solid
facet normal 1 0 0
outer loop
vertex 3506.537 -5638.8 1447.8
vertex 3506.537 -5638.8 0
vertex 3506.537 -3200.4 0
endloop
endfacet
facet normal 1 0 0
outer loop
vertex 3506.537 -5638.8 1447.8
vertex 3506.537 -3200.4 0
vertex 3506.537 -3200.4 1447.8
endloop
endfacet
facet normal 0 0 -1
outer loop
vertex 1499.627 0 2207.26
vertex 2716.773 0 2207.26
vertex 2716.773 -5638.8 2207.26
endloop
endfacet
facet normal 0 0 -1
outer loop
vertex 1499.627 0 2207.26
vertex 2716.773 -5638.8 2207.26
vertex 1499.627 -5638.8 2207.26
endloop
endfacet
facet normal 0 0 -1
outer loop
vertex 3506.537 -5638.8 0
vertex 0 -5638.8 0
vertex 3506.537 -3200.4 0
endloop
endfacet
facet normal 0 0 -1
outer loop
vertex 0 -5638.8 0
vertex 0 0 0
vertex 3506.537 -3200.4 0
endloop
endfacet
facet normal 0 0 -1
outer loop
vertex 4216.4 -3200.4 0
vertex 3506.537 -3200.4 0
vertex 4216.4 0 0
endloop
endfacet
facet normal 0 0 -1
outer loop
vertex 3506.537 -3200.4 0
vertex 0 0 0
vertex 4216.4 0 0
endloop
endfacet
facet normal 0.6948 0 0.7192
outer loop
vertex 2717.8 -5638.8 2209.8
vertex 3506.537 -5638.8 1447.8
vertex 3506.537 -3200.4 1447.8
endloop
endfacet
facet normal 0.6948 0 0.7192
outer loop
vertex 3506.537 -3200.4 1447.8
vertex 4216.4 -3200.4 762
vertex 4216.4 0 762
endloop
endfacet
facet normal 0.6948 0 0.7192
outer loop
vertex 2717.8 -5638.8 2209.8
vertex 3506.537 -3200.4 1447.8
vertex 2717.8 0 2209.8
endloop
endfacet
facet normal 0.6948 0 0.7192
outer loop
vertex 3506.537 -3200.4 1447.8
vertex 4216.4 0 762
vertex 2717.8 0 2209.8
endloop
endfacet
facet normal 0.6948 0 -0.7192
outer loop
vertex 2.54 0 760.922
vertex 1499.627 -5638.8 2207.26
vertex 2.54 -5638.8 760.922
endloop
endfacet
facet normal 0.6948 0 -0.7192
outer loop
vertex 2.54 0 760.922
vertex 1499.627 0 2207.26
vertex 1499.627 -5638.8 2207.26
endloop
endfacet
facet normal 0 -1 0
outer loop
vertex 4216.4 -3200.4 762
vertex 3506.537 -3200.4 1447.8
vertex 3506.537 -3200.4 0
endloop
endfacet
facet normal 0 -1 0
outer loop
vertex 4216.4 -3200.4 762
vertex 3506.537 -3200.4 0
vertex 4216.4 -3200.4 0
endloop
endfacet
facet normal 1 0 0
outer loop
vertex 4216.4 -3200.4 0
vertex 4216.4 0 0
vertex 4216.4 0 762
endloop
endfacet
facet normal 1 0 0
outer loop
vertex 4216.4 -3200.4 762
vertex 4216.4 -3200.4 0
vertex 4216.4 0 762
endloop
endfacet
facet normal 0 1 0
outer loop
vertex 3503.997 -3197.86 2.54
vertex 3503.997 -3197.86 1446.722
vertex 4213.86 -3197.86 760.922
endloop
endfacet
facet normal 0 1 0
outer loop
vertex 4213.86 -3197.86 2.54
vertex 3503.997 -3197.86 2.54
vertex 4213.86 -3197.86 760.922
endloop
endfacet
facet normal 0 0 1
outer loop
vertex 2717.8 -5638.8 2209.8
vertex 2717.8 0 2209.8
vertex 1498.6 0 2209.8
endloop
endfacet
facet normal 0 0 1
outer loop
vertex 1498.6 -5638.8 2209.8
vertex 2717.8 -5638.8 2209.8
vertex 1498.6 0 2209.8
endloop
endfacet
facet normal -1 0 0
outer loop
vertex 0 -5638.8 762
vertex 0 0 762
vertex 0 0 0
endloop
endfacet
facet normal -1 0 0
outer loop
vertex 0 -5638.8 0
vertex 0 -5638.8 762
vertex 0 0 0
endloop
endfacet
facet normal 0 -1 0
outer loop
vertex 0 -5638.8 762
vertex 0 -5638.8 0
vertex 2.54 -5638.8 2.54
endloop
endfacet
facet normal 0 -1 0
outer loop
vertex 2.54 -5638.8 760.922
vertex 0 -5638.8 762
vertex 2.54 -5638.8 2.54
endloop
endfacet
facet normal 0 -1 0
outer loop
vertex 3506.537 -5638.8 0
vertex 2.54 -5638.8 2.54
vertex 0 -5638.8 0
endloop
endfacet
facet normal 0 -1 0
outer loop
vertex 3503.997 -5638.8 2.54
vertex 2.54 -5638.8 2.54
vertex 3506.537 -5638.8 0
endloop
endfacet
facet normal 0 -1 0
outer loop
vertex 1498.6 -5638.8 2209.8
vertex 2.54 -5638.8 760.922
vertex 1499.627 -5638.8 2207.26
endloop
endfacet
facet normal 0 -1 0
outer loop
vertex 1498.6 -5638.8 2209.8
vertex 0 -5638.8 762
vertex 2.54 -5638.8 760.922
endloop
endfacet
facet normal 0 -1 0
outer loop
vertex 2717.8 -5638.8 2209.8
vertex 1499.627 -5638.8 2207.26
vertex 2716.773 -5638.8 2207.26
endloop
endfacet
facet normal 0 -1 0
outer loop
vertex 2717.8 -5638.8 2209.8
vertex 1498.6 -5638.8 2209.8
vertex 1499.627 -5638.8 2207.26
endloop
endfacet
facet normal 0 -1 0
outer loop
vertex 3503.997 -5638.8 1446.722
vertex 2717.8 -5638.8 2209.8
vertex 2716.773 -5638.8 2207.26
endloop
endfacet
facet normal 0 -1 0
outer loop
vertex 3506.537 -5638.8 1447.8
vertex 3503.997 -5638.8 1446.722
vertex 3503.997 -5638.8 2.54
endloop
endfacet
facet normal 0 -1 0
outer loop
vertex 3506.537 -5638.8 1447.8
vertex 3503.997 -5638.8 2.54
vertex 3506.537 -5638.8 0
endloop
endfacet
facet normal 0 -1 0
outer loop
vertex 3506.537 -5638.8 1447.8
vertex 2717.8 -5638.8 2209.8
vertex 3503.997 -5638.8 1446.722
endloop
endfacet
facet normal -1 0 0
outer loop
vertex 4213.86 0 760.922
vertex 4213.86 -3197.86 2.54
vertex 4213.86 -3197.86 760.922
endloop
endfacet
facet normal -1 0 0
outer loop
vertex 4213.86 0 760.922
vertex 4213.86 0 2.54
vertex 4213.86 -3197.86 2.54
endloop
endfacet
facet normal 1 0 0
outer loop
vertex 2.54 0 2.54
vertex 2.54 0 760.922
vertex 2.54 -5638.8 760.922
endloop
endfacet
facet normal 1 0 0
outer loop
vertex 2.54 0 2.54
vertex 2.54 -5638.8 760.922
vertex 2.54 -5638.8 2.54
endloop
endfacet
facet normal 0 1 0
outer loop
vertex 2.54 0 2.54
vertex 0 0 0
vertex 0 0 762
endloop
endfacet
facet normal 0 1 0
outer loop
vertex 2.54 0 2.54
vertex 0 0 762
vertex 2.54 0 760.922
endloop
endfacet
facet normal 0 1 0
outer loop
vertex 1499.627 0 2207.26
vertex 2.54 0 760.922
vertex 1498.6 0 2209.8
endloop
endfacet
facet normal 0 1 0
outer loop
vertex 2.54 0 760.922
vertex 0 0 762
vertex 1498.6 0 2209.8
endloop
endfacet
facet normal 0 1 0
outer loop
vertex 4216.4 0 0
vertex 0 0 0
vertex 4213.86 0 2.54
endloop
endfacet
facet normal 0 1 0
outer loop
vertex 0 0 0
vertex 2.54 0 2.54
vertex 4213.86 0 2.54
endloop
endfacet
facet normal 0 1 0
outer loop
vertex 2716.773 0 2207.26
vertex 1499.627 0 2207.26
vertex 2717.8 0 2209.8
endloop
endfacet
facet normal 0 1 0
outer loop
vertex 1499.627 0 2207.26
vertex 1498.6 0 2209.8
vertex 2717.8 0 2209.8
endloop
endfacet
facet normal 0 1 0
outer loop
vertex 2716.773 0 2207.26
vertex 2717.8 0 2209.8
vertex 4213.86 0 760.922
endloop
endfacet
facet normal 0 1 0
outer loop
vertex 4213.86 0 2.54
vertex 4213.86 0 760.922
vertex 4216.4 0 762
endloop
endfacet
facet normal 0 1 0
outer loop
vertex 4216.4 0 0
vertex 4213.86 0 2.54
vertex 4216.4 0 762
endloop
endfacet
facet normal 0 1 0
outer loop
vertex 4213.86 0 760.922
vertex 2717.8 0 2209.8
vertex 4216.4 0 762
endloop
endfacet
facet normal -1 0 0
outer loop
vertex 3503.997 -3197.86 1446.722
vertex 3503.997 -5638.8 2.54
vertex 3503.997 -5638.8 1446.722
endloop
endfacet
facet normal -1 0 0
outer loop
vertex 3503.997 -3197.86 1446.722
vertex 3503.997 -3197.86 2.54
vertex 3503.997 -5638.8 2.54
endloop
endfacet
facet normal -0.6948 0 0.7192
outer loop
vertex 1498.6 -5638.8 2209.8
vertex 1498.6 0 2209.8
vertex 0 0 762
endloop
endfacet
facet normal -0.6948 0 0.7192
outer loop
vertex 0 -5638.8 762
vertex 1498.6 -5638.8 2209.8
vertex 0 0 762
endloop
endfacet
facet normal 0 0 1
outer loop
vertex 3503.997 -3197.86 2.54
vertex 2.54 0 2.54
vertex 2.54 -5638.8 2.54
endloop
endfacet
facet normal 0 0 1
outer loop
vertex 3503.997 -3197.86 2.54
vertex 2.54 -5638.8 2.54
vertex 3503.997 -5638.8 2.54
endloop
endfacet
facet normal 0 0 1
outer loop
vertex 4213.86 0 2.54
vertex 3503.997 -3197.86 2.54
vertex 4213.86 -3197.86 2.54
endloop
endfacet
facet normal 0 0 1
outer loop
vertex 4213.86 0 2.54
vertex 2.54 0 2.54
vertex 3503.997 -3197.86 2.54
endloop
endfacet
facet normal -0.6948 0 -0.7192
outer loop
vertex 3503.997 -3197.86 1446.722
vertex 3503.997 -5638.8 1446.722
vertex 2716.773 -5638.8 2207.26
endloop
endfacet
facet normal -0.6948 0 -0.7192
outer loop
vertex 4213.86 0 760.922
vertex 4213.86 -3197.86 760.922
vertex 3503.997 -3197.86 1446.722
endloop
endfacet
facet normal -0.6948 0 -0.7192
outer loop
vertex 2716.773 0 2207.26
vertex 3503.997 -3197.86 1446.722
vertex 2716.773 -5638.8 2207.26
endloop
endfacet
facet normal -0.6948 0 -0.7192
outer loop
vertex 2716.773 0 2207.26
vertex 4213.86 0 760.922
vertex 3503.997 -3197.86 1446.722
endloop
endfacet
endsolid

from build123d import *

# Parameters (mm, degrees)
F1_DEPTH = 3200.4
F3_DEPTH = 2438.4
F4_T     = -2.54


with BuildPart() as f1:
    # F0 (on Front) → F1 (new body)
    with BuildSketch(Plane.XZ):
        Polygon((0, 762), (0, 0), (4216.4, 0), (4216.4, 762), (2717.8, 2209.8), (1498.6, 2209.8), align=None)
    extrude(amount=F1_DEPTH)

    # F2 (on face) → F3 (join)
    with BuildSketch(Plane.XZ.offset(3200.4)):
        Polygon((0, 762), (0, 0), (3506.5368421053, 0), (3506.5368421053, 1447.8), (2717.8, 2209.8), (1498.6, 2209.8), align=None)
    extrude(amount=F3_DEPTH)

    # F4
    f4_openings = [f1.faces().sort_by_distance(p)[0] for p in [
        (2108.2, 0, 916.002545),
        (1896.624586, -5638.8, 958.626516),
    ]]
    offset(amount=F4_T, openings=f4_openings, kind=Kind.INTERSECTION)


solid = f1.part
